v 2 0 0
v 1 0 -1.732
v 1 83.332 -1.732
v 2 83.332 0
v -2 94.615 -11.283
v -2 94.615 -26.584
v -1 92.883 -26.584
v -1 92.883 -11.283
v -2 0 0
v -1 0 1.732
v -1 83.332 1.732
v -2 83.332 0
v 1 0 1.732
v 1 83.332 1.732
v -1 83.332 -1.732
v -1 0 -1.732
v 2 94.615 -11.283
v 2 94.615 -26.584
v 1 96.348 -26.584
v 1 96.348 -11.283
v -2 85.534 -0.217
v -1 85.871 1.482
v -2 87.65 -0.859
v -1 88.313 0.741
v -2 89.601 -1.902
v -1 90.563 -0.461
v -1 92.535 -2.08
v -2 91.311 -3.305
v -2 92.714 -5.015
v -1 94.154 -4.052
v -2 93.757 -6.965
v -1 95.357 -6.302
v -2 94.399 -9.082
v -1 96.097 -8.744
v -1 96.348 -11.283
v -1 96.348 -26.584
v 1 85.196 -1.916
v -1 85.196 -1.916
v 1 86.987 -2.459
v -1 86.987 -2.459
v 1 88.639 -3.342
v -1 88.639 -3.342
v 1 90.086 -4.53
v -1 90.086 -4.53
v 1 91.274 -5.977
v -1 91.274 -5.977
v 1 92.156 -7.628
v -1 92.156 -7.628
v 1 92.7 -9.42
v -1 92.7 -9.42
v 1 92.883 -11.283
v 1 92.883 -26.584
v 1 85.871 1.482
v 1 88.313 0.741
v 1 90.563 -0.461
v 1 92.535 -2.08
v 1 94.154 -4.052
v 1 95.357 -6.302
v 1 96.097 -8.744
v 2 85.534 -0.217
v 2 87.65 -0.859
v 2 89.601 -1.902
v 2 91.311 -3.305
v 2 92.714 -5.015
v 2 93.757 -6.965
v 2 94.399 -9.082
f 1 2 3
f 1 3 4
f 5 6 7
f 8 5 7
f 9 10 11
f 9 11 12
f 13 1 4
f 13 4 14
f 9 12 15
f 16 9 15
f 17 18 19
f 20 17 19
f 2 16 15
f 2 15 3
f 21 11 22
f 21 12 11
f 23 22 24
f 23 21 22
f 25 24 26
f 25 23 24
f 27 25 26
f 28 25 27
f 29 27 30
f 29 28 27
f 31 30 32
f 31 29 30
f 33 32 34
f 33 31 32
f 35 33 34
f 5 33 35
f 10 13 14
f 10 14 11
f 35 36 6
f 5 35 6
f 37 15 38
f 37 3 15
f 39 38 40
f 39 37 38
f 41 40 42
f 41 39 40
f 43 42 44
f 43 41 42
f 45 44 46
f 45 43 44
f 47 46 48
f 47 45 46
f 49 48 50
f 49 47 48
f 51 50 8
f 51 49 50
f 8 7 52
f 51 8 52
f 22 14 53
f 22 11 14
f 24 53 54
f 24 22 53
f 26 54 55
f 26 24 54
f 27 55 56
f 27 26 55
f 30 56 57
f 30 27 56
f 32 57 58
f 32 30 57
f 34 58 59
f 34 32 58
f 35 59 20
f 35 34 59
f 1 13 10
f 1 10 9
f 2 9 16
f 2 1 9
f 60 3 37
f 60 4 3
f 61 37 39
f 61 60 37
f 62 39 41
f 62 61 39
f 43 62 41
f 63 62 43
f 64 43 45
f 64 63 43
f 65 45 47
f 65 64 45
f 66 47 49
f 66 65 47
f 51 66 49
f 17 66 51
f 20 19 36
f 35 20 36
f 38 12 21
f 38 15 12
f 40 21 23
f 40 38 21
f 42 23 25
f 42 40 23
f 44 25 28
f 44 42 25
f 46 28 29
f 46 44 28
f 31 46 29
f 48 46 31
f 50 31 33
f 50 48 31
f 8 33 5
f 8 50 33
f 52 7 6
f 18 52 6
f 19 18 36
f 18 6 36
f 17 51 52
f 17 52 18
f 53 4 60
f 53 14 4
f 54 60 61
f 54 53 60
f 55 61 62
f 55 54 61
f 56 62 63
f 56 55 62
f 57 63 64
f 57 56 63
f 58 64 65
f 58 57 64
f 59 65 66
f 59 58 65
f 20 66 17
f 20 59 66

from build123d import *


with BuildPart() as f2:
    # F2: sweep along a path in F1
    with BuildLine(Plane.YZ) as f2_path:
        Line((0, 5.226784), (83.332258, 5.226784))
        ThreePointArc((83.332258, 5.226784), (95.006591, 0.391117), (99.842258, -11.283216))
        Line((99.842258, -11.283216), (99.842258, -26.583992))
    # F0 (on Front) → F2 (sweep)
    with BuildSketch(Plane.XZ):
        Polygon((-1, -1.732051), (1, -1.732051), (2, 0), (1, 1.732051), (-1, 1.732051), (-2, 0), align=None)
    sweep(path=f2_path.line)


solid = f2.part
